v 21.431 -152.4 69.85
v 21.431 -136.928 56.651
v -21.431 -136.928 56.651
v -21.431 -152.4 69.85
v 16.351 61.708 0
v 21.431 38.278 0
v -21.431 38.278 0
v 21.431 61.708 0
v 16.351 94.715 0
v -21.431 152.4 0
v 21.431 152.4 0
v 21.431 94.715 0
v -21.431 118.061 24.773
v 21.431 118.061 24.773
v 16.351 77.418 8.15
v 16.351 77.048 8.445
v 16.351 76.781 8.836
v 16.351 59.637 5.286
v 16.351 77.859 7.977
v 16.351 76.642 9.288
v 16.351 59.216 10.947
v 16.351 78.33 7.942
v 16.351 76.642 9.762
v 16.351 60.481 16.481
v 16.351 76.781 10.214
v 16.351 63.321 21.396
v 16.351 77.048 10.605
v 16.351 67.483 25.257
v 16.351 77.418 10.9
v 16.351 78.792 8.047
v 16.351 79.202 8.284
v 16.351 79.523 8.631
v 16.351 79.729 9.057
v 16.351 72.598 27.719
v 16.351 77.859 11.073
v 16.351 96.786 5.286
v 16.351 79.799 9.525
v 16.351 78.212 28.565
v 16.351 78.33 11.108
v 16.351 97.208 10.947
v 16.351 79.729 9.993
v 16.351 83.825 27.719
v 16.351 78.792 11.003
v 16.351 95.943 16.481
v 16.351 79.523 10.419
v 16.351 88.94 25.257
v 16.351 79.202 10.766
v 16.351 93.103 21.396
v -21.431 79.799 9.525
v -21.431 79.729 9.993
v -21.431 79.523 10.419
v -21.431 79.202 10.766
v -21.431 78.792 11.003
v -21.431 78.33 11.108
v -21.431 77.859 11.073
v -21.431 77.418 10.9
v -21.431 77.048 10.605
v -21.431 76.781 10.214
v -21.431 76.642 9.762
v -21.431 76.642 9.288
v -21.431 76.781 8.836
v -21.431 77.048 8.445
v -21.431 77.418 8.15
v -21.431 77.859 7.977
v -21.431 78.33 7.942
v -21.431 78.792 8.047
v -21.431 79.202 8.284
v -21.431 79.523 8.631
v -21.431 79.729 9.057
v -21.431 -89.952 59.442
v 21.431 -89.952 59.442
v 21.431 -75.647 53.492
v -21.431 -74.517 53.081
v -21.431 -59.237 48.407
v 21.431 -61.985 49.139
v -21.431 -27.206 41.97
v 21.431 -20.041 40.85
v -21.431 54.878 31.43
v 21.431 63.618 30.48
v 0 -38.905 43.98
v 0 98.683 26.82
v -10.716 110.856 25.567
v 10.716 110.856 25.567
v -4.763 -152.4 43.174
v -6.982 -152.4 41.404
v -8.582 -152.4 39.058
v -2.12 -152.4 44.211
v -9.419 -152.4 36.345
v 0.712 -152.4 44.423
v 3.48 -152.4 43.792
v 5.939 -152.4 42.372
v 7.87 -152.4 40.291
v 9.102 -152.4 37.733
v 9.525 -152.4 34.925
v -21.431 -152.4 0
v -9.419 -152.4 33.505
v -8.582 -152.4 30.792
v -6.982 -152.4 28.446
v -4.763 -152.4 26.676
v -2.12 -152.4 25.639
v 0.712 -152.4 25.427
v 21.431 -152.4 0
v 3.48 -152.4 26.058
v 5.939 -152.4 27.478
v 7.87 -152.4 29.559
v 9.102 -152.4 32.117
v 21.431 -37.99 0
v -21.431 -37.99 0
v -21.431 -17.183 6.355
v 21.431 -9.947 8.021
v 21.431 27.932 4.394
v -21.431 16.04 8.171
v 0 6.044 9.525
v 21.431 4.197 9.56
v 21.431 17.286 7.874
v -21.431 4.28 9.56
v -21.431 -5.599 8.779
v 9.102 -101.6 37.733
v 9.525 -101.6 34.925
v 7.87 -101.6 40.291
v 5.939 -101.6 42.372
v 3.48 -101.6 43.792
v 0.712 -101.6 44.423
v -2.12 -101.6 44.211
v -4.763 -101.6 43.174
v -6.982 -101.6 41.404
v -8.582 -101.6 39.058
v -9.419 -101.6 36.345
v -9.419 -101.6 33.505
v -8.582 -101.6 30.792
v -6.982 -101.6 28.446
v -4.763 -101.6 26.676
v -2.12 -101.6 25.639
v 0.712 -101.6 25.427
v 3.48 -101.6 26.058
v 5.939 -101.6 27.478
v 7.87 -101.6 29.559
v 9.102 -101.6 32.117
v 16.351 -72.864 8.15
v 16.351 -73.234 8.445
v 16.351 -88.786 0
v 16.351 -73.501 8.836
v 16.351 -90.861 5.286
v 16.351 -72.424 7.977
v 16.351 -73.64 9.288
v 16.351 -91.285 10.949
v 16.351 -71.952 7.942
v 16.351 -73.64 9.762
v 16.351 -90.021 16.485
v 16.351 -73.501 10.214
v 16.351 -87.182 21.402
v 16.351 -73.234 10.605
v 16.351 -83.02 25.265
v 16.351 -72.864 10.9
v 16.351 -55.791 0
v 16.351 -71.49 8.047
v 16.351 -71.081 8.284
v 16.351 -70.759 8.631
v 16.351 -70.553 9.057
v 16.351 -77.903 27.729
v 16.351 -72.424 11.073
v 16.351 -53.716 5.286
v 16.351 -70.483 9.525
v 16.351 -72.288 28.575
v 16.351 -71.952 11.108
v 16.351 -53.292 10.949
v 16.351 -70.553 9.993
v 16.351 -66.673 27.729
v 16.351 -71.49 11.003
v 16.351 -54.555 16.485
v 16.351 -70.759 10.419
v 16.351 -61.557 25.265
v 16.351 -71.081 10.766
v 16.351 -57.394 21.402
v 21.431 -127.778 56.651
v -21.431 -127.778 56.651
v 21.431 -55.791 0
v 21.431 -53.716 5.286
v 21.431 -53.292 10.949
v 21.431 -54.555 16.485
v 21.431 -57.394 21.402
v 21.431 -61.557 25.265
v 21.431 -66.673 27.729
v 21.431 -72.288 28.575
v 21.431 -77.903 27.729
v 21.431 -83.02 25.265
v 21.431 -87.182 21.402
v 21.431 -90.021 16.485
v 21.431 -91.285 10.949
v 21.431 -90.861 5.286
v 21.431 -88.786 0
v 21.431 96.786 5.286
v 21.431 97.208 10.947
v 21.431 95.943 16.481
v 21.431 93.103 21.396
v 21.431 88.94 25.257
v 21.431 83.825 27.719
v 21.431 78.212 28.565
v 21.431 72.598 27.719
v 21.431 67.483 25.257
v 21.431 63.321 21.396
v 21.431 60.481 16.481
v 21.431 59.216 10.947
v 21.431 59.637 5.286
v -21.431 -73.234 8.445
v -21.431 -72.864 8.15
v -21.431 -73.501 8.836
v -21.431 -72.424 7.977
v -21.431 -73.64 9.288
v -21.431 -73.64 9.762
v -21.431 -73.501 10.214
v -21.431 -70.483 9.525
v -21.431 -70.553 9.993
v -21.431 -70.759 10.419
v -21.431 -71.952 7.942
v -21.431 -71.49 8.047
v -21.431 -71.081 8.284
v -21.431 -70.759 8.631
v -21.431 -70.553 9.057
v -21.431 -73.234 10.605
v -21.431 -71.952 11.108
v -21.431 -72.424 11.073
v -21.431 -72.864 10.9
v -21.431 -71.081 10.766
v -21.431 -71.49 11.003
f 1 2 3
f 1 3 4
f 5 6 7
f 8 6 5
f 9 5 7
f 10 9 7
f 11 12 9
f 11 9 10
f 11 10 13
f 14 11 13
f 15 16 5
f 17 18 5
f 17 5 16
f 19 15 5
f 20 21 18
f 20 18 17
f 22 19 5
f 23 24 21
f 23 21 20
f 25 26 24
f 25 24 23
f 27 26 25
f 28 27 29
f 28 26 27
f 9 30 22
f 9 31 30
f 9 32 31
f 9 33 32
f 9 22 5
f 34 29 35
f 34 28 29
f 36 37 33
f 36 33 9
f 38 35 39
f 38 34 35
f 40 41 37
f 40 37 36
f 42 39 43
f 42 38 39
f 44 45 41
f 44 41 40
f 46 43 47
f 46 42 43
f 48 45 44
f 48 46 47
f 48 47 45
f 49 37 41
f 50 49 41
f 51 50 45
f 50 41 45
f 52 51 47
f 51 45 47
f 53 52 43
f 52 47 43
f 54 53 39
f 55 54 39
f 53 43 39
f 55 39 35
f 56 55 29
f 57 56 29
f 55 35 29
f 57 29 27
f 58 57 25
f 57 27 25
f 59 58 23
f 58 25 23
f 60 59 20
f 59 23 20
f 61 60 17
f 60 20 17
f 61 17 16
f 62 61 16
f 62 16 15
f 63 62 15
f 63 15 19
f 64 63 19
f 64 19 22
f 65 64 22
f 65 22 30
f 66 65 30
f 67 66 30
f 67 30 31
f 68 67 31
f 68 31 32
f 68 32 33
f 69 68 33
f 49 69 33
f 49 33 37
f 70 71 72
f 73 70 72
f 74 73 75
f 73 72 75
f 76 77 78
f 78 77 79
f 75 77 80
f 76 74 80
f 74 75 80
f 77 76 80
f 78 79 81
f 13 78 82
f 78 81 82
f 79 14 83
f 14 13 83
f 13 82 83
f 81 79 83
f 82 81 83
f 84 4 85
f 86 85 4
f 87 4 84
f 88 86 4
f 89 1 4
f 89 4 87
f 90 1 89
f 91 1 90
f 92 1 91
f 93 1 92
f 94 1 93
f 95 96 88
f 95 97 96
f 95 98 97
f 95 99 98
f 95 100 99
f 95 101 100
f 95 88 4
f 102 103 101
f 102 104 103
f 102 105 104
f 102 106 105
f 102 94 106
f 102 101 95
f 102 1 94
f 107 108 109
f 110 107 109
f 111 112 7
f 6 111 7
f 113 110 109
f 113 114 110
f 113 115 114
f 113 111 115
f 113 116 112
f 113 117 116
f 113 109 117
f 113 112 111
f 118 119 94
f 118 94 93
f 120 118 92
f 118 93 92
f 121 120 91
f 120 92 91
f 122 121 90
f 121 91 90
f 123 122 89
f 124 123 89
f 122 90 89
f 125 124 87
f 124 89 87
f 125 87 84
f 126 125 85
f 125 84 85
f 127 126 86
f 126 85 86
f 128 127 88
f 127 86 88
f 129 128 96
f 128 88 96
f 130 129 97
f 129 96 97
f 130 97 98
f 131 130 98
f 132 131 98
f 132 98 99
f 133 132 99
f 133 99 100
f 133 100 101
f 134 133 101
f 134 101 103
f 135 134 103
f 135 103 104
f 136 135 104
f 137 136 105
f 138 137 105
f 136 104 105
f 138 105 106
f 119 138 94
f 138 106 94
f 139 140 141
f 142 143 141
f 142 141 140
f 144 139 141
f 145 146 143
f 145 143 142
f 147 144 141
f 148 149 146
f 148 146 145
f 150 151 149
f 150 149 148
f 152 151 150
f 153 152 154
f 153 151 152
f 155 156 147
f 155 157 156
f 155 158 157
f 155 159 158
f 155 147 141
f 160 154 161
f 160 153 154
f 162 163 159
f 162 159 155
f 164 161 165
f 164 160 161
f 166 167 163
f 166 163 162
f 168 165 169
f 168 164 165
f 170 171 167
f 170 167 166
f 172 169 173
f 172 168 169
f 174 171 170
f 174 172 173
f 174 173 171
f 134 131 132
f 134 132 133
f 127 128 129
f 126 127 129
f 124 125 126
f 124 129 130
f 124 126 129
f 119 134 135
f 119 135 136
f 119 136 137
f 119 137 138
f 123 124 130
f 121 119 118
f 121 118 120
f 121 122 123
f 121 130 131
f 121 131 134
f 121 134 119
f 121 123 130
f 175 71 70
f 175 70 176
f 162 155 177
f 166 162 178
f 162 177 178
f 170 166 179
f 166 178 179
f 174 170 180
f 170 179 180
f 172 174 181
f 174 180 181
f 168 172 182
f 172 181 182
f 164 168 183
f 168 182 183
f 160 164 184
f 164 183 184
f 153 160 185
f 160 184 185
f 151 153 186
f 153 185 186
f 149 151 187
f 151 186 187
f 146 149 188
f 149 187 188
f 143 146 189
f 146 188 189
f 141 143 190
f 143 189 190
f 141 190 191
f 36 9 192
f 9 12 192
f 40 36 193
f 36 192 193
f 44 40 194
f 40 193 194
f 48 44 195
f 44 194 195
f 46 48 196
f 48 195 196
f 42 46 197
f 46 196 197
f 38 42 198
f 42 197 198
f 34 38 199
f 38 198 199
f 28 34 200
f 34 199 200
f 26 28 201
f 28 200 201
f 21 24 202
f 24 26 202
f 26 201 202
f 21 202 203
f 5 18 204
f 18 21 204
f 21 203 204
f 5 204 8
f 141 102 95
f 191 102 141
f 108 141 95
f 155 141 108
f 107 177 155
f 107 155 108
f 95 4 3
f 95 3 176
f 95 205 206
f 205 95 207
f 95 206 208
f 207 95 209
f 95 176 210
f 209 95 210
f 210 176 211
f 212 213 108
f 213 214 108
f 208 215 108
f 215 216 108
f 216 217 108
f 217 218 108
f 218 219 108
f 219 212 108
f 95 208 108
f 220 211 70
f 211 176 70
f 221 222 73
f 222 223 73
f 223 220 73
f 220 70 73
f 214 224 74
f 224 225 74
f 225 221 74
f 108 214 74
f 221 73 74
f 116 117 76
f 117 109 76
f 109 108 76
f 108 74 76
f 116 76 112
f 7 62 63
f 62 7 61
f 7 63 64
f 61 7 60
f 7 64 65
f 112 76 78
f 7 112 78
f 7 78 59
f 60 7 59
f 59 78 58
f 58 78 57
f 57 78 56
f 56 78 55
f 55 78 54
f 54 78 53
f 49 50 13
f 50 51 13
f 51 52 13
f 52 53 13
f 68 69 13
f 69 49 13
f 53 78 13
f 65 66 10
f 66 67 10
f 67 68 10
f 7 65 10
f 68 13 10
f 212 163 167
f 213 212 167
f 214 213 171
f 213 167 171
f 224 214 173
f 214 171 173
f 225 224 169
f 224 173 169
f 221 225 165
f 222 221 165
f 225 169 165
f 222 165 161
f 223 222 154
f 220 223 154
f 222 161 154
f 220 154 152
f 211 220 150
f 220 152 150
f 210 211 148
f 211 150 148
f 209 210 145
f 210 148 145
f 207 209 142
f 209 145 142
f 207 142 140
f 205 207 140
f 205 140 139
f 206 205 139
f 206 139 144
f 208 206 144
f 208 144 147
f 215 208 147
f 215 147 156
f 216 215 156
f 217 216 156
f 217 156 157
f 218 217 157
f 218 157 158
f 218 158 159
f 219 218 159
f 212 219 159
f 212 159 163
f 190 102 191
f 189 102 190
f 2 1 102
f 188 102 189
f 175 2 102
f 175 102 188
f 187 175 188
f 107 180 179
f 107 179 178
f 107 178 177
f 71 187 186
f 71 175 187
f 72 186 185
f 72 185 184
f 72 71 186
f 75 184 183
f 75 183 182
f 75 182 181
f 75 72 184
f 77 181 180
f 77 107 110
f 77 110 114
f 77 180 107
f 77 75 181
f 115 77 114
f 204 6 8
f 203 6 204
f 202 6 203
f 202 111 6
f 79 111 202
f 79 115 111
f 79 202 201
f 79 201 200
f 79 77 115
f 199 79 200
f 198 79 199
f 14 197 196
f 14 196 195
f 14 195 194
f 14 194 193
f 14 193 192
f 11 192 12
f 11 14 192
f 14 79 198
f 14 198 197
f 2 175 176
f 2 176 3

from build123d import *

# Parameters (mm, degrees)
F1_DEPTH = 21.43125
F2_R     = 9.525
F3_DEPTH = 50.8
F4_R     = 1.5875
F6_DEPTH = 43.18
F7_R     = 19.05
F8_DEPTH = 5.08


with BuildPart() as f1:
    # F0 (on Right) → F1 (new body, symmetric)
    with BuildSketch(Plane.YZ):
        Polygon((-152.4, 69.85), (-152.4, 0), (152.4, 0), (152.4, 19.05), align=None)
    extrude(amount=F1_DEPTH, both=True)

    # F2 (on face) → F3 (cut)
    with BuildSketch(Plane.XZ.offset(152.4)):
        with Locations((0, 34.925)):
            Circle(F2_R)
    extrude(amount=-F3_DEPTH, mode=Mode.SUBTRACT)

    # F4 (on face) → F6 (intersect)
    with BuildSketch(Plane.YZ.offset(21.43125)):
        with BuildLine():
            Line((152.4, 0), (118.0612299003, 24.77312835))
            add(Edge.make_bspline(
                [(-89.9518863056, 59.4419810509), (-78.3312719762, 54.2757015098), (-46.7012859115, 40.2136781728), (104.83454077, 26.4256487446), (118.0612299003, 24.77312835)],
                knots=[0, 0, 0, 0, 0.3407661179, 0.9275264848, 0.9275264848, 0.9275264848, 0.9275264848], degree=3))
            Line((-89.9518863056, 59.4419810509), (-127.7775764465, 56.6512197256))
            Line((-127.7775764465, 56.6512197256), (-136.9280835145, 56.6512197256))
            Line((-136.9280835145, 56.6512197256), (-152.4, 69.85))
            Line((-152.4, 69.85), (-152.4, 0))
            Line((-152.4, 0), (-37.9903614521, 0))
            add(Edge.make_bspline(
                [(-37.9903614521, 0), (-22.7117503508, 5.0129187767), (5.7637416088, 14.3557397552), (27.9814406153, 4.5462011009), (38.2781662047, 0)],
                knots=[0, 0, 0, 0, 0.5365530163, 1, 1, 1, 1], degree=3))
            Line((38.2781662047, 0), (152.4, 0))
        make_face()
        with Locations((-72.0704272389, 9.525)):
            Circle(F4_R, mode=Mode.SUBTRACT)
        with Locations((78.2117620111, 9.525)):
            Circle(F4_R, mode=Mode.SUBTRACT)
    extrude(amount=-F6_DEPTH, mode=Mode.INTERSECT)

    # F7 (on face) → F8 (cut)
    with BuildSketch(Plane.YZ.offset(21.43125)):
        with Locations((-72.2883281696, 9.525)):
            Circle(F7_R)
        with Locations((78.2117247581, 9.5152128488)):
            Circle(F7_R)
    extrude(amount=-F8_DEPTH, mode=Mode.SUBTRACT)


solid = f1.part
